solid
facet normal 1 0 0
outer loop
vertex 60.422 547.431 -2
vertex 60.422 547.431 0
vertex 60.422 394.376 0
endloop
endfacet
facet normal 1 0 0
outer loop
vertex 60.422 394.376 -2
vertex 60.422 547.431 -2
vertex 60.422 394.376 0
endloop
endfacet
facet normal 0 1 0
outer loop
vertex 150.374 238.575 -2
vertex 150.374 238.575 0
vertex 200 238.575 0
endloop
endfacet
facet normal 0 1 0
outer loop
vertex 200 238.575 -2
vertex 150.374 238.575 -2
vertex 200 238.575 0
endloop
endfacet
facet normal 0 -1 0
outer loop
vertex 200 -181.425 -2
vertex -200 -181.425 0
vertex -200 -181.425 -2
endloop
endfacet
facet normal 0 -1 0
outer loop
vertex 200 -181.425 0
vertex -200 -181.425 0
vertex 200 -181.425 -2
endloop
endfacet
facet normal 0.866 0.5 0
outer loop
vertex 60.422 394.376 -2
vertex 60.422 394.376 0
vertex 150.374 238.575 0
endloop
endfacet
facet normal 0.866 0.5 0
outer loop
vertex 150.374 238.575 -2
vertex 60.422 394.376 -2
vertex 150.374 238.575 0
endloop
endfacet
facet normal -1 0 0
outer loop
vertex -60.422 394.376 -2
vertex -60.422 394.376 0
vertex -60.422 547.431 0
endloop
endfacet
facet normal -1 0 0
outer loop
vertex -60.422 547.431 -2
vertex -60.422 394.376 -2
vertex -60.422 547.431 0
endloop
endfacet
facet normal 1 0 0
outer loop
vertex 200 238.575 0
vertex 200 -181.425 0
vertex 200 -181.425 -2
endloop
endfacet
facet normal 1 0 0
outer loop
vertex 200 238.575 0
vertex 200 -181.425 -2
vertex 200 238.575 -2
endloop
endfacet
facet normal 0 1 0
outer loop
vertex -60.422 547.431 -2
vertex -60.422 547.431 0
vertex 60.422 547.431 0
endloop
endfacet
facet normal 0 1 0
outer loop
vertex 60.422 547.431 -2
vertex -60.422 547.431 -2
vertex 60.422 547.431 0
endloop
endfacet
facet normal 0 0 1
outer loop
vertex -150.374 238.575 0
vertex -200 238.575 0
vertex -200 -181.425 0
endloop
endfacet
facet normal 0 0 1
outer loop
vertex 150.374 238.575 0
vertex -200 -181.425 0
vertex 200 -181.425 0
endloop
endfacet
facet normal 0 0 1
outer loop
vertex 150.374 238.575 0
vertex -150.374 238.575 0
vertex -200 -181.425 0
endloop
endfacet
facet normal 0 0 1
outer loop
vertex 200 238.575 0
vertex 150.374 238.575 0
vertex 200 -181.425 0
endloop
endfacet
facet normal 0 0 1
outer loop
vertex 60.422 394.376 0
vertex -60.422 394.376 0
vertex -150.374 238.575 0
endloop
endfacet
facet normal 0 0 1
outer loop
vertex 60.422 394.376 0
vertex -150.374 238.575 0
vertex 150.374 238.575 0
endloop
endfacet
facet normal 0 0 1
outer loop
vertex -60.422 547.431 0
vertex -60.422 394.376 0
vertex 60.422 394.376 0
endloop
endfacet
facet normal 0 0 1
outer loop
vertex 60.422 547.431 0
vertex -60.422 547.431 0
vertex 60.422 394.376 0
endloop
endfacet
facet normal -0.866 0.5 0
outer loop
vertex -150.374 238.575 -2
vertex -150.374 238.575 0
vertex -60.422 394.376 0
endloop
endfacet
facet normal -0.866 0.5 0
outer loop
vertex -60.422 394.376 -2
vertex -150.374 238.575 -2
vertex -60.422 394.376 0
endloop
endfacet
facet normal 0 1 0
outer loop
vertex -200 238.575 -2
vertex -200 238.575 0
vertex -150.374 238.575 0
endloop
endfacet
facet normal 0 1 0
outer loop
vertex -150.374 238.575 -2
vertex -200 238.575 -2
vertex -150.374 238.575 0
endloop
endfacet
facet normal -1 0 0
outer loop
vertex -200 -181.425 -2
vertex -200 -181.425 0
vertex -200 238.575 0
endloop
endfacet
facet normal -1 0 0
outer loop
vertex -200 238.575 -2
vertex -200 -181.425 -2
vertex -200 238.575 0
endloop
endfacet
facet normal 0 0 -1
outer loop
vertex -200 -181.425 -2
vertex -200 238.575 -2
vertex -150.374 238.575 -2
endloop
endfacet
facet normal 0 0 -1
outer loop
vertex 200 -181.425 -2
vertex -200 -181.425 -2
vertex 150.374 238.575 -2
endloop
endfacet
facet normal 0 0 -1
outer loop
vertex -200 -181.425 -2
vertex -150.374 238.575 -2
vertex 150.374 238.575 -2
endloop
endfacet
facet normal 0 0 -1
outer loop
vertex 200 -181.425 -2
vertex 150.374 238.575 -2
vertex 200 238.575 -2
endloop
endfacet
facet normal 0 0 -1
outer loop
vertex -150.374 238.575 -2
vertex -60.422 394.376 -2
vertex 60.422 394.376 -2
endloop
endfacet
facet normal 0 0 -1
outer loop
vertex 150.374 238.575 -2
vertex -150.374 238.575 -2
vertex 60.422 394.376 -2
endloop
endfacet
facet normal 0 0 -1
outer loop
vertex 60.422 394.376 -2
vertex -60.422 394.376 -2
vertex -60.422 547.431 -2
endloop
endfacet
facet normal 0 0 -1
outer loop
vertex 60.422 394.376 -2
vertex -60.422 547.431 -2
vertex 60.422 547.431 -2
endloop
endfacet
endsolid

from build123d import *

# Parameters (mm, degrees)
SKETCH2_W          = 400
SKETCH2_H          = 420
BASE_FLANGE1_DEPTH = 2
TAB1_DEPTH         = 2


# Sheet-metal steps are written as plain solids
with BuildPart() as part:
    # Sketch2 → Base-Flange1 (new body)
    with BuildSketch(Plane.XY):
        with Locations((0, 28.575414969)):
            Rectangle(SKETCH2_W, SKETCH2_H)
    extrude(amount=-BASE_FLANGE1_DEPTH)

    # Sketch5 → Tab1 (add)
    with BuildSketch(Plane.XY):
        Polygon((-60.421834446, 394.376455492), (-60.421834446, 547.430628062), (60.421834446, 547.430628062), (60.421834446, 394.376455492), (150.373607132, 238.575414969), (-150.373607132, 238.575414969), align=None)
    extrude(amount=-TAB1_DEPTH)


solid = part.part
